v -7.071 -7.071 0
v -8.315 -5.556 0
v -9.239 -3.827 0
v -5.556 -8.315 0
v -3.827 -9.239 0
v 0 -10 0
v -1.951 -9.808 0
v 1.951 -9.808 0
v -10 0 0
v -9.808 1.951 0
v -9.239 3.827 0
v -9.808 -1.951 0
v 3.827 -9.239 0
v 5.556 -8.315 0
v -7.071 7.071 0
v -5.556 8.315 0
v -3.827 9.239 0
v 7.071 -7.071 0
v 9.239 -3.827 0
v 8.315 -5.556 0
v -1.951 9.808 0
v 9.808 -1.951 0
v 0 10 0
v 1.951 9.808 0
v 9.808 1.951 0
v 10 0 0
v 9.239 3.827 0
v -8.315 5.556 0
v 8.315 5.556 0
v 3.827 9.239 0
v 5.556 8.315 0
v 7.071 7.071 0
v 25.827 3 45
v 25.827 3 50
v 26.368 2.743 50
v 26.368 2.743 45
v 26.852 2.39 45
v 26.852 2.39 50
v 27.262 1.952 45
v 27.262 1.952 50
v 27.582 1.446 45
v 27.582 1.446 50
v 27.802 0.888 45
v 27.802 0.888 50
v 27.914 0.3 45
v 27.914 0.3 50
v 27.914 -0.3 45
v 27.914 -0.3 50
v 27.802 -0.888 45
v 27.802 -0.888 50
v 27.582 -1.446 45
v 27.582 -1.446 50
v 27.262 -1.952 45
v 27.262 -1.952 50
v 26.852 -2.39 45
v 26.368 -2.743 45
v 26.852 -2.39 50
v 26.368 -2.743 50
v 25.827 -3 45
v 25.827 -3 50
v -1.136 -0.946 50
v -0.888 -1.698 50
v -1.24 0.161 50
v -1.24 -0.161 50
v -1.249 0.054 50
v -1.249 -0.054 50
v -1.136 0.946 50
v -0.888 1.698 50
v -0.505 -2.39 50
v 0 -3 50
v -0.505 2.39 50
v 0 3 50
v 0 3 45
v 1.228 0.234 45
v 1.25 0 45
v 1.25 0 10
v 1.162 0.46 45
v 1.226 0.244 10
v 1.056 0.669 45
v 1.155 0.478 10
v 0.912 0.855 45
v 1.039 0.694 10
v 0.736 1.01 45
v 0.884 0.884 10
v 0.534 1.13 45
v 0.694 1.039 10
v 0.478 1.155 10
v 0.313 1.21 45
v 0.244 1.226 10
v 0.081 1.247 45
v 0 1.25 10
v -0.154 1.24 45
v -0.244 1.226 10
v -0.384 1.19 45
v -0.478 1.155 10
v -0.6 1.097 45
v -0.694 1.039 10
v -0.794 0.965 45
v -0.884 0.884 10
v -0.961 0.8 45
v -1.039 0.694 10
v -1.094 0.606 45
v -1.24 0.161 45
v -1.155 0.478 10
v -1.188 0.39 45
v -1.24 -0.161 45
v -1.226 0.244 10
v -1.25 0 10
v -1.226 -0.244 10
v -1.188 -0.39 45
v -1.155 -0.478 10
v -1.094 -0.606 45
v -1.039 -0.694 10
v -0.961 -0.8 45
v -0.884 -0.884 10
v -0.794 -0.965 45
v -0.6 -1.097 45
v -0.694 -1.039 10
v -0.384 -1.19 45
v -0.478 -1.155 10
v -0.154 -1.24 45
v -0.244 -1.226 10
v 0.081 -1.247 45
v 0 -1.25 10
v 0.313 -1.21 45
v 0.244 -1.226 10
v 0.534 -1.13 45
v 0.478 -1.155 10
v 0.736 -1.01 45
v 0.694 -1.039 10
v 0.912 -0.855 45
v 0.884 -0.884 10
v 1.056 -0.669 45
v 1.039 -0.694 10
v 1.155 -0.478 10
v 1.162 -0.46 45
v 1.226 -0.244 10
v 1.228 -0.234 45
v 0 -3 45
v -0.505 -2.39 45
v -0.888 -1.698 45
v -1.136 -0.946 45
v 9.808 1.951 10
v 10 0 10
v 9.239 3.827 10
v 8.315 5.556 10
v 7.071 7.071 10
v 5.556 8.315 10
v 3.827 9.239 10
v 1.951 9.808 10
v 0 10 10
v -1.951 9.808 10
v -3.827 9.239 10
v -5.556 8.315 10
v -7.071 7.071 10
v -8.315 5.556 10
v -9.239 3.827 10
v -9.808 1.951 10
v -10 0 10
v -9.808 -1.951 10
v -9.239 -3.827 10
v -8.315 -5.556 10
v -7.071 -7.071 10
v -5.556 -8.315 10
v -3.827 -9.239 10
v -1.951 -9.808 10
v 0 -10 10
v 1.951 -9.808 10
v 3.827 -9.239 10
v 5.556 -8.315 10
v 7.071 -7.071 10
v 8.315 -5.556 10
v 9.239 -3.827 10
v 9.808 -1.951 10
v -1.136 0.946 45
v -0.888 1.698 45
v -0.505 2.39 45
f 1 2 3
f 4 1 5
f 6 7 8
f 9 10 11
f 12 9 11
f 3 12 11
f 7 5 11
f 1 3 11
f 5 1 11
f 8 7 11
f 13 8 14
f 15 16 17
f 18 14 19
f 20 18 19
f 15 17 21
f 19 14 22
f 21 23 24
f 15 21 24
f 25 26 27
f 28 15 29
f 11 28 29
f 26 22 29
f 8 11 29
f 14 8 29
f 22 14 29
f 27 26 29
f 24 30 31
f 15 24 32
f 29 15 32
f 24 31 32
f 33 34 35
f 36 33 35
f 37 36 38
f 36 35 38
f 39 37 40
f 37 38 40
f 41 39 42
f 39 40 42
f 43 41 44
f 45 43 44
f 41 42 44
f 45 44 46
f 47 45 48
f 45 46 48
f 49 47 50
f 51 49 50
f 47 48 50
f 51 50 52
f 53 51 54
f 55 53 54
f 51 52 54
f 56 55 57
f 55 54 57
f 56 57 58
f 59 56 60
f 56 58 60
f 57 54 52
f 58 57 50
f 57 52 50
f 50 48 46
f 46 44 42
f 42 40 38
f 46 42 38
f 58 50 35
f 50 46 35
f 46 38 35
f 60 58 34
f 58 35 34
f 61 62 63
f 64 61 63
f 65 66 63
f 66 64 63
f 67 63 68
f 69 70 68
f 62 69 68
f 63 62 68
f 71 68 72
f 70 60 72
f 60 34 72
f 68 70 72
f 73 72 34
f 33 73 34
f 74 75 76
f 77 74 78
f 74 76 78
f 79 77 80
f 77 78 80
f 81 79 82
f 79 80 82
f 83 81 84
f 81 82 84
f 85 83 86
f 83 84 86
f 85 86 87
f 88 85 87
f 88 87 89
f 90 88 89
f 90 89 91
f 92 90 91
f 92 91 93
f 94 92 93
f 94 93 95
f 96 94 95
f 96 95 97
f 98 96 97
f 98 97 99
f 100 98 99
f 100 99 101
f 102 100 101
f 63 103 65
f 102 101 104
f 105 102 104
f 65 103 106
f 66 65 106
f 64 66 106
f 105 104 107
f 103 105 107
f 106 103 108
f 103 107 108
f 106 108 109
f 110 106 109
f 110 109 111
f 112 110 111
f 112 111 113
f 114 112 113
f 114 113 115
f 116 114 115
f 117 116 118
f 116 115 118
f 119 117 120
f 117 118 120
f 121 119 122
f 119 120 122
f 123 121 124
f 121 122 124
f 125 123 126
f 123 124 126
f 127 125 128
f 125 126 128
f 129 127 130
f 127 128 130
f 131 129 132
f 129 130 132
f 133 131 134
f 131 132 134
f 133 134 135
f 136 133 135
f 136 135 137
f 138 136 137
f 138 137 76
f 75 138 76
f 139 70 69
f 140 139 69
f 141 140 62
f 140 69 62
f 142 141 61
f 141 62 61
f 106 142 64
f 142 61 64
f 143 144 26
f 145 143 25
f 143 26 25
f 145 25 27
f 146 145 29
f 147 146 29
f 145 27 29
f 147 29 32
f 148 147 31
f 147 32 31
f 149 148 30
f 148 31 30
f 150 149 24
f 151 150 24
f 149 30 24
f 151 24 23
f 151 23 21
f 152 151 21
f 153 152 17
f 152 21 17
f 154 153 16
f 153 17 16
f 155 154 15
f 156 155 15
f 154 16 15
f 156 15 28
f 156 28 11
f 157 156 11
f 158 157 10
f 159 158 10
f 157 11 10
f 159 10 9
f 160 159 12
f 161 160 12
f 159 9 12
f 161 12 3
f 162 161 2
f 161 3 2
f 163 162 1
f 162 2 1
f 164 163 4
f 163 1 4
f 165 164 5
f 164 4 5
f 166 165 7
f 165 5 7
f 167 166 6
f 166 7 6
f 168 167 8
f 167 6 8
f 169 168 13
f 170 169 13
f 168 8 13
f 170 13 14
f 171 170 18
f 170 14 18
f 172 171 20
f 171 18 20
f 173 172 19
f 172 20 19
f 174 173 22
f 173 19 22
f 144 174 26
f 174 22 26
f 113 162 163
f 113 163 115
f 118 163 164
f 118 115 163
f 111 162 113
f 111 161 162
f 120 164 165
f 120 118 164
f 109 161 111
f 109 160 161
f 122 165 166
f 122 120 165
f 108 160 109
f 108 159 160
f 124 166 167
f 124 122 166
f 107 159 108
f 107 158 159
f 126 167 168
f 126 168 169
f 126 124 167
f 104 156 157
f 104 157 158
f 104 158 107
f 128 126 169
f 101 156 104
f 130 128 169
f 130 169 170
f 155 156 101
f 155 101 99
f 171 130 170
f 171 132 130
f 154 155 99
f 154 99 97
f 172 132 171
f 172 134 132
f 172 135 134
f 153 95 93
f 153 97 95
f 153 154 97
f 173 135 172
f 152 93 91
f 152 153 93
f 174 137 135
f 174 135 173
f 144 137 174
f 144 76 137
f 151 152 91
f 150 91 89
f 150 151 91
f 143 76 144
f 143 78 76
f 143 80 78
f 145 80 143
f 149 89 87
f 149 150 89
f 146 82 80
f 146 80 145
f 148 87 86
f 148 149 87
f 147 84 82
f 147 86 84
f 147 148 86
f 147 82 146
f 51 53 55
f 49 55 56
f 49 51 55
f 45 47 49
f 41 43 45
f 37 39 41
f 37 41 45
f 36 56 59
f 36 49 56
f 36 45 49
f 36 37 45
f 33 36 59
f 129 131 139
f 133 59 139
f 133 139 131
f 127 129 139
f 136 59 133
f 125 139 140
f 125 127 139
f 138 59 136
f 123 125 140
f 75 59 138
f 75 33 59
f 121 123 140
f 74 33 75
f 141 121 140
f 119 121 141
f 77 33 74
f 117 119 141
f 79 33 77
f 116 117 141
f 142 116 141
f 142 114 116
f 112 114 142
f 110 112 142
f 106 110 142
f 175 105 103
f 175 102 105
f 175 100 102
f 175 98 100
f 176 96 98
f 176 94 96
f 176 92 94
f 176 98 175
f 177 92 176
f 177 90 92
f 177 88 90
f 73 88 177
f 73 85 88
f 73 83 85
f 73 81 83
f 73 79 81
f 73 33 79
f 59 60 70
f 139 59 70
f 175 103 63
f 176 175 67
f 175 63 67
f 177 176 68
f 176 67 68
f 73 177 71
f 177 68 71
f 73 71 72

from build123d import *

# Parameters (mm, degrees)
SKETCH_1_R      = 10
EXTRUDE_1_DEPTH = 10
SKETCH_2_R      = 1.25
EXTRUDE_2_DEPTH = 40
EXTRUDE_3_DEPTH = 5


with BuildPart() as part:
    # Эскиз1 → Бобышка-Вытянуть1 (new body)
    with BuildSketch(Plane.XY):
        Circle(SKETCH_1_R)
    extrude(amount=EXTRUDE_1_DEPTH)

    # Эскиз2 → Бобышка-Вытянуть2 (add)
    with BuildSketch(Plane.XY.offset(10)):
        Circle(SKETCH_2_R)
    extrude(amount=EXTRUDE_2_DEPTH)

    # Эскиз3 → Бобышка-Вытянуть3 (add)
    with BuildSketch(Plane.XY.offset(50)):
        with BuildLine():
            Line((0, 3), (25.827062473, 3))
            ThreePointArc((25.827062473, 3), (27.92788481, 0), (25.827062473, -3))
            Line((25.827062473, -3), (0, -3))
            ThreePointArc((0, -3), (-1.242640687, 0), (0, 3))
        make_face()
    extrude(amount=-EXTRUDE_3_DEPTH)


solid = part.part
